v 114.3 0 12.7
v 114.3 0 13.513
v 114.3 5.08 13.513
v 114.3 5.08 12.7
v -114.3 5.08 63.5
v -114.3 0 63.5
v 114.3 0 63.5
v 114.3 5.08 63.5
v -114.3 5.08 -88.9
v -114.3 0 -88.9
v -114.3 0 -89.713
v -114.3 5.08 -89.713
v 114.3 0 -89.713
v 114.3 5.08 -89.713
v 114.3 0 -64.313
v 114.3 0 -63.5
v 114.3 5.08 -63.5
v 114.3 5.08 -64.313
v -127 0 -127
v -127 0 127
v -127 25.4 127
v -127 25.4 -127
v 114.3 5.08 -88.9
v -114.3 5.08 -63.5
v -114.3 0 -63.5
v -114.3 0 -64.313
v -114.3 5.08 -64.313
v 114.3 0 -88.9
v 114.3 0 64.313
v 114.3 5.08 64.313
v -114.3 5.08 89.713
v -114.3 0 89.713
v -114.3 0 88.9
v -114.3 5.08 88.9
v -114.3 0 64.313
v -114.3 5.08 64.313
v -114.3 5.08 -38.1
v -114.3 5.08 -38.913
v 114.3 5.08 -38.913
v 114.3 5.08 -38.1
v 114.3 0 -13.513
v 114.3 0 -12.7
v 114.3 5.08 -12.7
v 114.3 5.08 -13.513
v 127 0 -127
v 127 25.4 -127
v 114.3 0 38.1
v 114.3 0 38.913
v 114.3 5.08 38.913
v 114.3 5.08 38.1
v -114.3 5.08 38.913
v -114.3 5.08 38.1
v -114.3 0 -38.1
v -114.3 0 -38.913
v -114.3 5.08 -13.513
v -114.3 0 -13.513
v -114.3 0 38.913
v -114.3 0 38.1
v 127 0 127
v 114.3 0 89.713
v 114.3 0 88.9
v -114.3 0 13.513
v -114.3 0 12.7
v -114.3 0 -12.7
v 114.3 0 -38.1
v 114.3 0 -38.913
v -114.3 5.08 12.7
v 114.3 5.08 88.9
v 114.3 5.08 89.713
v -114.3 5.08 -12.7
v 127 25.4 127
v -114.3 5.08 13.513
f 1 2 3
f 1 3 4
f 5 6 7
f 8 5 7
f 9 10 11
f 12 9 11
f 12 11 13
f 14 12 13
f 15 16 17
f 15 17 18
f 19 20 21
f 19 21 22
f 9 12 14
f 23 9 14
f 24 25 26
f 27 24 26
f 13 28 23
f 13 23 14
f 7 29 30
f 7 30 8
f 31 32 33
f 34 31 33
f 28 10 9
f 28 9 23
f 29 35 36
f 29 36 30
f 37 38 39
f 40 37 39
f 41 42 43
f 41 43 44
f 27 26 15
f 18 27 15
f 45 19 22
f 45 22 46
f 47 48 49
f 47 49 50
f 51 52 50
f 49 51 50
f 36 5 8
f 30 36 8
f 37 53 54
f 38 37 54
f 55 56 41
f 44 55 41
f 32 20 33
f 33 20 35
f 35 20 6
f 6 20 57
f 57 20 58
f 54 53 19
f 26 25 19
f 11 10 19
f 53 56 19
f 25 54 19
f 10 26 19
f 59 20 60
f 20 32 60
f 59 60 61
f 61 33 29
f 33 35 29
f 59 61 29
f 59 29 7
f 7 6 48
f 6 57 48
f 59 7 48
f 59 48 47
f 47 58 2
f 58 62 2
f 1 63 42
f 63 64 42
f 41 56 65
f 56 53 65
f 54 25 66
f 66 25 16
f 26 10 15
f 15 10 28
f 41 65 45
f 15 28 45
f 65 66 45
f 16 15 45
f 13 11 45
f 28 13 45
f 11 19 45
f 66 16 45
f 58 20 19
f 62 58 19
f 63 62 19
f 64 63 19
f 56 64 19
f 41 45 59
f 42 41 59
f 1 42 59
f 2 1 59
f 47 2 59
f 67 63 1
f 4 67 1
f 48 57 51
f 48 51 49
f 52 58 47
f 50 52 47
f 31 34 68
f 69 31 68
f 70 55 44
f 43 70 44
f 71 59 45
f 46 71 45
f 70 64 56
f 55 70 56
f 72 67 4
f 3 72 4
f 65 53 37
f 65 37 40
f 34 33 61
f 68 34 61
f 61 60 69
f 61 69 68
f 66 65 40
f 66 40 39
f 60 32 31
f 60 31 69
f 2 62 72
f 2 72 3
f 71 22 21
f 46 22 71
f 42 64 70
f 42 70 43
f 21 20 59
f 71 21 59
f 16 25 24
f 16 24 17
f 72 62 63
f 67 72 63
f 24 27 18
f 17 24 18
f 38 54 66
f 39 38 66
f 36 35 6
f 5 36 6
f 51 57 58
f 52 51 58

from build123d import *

# Parameters (mm, degrees)
SKETCH1_W           = 254
SKETCH1_H           = 254
BOSS_EXTRUDE2_DEPTH = 25.4
SKETCH3_W           = 228.6
SKETCH3_H           = 0.8128
CUT_EXTRUDE1_DEPTH  = 5.08


with BuildPart() as part:
    # Sketch1 → Boss-Extrude2 (new body)
    with BuildSketch(Plane(origin=(0, 0, 0), x_dir=(1, 0, 0), z_dir=(0, 1, 0))):
        Rectangle(SKETCH1_W, SKETCH1_H)
    extrude(amount=BOSS_EXTRUDE2_DEPTH)

    # Sketch3 → Cut-Extrude1 (cut)
    with BuildSketch(Plane(origin=(0, 0, 0), x_dir=(1, 0, 0), z_dir=(0, 1, 0))):
        with Locations((0, 89.3064)):
            Rectangle(SKETCH3_W, SKETCH3_H)
        with Locations((0, 63.9064)):
            Rectangle(SKETCH3_W, SKETCH3_H)
        with Locations((0, 38.5064)):
            Rectangle(SKETCH3_W, SKETCH3_H)
        with Locations((0, 13.1064)):
            Rectangle(SKETCH3_W, SKETCH3_H)
        with Locations((0, -13.1064)):
            Rectangle(SKETCH3_W, SKETCH3_H)
        with Locations((0, -38.5064)):
            Rectangle(SKETCH3_W, SKETCH3_H)
        with Locations((0, -63.9064)):
            Rectangle(SKETCH3_W, SKETCH3_H)
        with Locations((0, -89.3064)):
            Rectangle(SKETCH3_W, SKETCH3_H)
    extrude(amount=CUT_EXTRUDE1_DEPTH, mode=Mode.SUBTRACT)


solid = part.part
